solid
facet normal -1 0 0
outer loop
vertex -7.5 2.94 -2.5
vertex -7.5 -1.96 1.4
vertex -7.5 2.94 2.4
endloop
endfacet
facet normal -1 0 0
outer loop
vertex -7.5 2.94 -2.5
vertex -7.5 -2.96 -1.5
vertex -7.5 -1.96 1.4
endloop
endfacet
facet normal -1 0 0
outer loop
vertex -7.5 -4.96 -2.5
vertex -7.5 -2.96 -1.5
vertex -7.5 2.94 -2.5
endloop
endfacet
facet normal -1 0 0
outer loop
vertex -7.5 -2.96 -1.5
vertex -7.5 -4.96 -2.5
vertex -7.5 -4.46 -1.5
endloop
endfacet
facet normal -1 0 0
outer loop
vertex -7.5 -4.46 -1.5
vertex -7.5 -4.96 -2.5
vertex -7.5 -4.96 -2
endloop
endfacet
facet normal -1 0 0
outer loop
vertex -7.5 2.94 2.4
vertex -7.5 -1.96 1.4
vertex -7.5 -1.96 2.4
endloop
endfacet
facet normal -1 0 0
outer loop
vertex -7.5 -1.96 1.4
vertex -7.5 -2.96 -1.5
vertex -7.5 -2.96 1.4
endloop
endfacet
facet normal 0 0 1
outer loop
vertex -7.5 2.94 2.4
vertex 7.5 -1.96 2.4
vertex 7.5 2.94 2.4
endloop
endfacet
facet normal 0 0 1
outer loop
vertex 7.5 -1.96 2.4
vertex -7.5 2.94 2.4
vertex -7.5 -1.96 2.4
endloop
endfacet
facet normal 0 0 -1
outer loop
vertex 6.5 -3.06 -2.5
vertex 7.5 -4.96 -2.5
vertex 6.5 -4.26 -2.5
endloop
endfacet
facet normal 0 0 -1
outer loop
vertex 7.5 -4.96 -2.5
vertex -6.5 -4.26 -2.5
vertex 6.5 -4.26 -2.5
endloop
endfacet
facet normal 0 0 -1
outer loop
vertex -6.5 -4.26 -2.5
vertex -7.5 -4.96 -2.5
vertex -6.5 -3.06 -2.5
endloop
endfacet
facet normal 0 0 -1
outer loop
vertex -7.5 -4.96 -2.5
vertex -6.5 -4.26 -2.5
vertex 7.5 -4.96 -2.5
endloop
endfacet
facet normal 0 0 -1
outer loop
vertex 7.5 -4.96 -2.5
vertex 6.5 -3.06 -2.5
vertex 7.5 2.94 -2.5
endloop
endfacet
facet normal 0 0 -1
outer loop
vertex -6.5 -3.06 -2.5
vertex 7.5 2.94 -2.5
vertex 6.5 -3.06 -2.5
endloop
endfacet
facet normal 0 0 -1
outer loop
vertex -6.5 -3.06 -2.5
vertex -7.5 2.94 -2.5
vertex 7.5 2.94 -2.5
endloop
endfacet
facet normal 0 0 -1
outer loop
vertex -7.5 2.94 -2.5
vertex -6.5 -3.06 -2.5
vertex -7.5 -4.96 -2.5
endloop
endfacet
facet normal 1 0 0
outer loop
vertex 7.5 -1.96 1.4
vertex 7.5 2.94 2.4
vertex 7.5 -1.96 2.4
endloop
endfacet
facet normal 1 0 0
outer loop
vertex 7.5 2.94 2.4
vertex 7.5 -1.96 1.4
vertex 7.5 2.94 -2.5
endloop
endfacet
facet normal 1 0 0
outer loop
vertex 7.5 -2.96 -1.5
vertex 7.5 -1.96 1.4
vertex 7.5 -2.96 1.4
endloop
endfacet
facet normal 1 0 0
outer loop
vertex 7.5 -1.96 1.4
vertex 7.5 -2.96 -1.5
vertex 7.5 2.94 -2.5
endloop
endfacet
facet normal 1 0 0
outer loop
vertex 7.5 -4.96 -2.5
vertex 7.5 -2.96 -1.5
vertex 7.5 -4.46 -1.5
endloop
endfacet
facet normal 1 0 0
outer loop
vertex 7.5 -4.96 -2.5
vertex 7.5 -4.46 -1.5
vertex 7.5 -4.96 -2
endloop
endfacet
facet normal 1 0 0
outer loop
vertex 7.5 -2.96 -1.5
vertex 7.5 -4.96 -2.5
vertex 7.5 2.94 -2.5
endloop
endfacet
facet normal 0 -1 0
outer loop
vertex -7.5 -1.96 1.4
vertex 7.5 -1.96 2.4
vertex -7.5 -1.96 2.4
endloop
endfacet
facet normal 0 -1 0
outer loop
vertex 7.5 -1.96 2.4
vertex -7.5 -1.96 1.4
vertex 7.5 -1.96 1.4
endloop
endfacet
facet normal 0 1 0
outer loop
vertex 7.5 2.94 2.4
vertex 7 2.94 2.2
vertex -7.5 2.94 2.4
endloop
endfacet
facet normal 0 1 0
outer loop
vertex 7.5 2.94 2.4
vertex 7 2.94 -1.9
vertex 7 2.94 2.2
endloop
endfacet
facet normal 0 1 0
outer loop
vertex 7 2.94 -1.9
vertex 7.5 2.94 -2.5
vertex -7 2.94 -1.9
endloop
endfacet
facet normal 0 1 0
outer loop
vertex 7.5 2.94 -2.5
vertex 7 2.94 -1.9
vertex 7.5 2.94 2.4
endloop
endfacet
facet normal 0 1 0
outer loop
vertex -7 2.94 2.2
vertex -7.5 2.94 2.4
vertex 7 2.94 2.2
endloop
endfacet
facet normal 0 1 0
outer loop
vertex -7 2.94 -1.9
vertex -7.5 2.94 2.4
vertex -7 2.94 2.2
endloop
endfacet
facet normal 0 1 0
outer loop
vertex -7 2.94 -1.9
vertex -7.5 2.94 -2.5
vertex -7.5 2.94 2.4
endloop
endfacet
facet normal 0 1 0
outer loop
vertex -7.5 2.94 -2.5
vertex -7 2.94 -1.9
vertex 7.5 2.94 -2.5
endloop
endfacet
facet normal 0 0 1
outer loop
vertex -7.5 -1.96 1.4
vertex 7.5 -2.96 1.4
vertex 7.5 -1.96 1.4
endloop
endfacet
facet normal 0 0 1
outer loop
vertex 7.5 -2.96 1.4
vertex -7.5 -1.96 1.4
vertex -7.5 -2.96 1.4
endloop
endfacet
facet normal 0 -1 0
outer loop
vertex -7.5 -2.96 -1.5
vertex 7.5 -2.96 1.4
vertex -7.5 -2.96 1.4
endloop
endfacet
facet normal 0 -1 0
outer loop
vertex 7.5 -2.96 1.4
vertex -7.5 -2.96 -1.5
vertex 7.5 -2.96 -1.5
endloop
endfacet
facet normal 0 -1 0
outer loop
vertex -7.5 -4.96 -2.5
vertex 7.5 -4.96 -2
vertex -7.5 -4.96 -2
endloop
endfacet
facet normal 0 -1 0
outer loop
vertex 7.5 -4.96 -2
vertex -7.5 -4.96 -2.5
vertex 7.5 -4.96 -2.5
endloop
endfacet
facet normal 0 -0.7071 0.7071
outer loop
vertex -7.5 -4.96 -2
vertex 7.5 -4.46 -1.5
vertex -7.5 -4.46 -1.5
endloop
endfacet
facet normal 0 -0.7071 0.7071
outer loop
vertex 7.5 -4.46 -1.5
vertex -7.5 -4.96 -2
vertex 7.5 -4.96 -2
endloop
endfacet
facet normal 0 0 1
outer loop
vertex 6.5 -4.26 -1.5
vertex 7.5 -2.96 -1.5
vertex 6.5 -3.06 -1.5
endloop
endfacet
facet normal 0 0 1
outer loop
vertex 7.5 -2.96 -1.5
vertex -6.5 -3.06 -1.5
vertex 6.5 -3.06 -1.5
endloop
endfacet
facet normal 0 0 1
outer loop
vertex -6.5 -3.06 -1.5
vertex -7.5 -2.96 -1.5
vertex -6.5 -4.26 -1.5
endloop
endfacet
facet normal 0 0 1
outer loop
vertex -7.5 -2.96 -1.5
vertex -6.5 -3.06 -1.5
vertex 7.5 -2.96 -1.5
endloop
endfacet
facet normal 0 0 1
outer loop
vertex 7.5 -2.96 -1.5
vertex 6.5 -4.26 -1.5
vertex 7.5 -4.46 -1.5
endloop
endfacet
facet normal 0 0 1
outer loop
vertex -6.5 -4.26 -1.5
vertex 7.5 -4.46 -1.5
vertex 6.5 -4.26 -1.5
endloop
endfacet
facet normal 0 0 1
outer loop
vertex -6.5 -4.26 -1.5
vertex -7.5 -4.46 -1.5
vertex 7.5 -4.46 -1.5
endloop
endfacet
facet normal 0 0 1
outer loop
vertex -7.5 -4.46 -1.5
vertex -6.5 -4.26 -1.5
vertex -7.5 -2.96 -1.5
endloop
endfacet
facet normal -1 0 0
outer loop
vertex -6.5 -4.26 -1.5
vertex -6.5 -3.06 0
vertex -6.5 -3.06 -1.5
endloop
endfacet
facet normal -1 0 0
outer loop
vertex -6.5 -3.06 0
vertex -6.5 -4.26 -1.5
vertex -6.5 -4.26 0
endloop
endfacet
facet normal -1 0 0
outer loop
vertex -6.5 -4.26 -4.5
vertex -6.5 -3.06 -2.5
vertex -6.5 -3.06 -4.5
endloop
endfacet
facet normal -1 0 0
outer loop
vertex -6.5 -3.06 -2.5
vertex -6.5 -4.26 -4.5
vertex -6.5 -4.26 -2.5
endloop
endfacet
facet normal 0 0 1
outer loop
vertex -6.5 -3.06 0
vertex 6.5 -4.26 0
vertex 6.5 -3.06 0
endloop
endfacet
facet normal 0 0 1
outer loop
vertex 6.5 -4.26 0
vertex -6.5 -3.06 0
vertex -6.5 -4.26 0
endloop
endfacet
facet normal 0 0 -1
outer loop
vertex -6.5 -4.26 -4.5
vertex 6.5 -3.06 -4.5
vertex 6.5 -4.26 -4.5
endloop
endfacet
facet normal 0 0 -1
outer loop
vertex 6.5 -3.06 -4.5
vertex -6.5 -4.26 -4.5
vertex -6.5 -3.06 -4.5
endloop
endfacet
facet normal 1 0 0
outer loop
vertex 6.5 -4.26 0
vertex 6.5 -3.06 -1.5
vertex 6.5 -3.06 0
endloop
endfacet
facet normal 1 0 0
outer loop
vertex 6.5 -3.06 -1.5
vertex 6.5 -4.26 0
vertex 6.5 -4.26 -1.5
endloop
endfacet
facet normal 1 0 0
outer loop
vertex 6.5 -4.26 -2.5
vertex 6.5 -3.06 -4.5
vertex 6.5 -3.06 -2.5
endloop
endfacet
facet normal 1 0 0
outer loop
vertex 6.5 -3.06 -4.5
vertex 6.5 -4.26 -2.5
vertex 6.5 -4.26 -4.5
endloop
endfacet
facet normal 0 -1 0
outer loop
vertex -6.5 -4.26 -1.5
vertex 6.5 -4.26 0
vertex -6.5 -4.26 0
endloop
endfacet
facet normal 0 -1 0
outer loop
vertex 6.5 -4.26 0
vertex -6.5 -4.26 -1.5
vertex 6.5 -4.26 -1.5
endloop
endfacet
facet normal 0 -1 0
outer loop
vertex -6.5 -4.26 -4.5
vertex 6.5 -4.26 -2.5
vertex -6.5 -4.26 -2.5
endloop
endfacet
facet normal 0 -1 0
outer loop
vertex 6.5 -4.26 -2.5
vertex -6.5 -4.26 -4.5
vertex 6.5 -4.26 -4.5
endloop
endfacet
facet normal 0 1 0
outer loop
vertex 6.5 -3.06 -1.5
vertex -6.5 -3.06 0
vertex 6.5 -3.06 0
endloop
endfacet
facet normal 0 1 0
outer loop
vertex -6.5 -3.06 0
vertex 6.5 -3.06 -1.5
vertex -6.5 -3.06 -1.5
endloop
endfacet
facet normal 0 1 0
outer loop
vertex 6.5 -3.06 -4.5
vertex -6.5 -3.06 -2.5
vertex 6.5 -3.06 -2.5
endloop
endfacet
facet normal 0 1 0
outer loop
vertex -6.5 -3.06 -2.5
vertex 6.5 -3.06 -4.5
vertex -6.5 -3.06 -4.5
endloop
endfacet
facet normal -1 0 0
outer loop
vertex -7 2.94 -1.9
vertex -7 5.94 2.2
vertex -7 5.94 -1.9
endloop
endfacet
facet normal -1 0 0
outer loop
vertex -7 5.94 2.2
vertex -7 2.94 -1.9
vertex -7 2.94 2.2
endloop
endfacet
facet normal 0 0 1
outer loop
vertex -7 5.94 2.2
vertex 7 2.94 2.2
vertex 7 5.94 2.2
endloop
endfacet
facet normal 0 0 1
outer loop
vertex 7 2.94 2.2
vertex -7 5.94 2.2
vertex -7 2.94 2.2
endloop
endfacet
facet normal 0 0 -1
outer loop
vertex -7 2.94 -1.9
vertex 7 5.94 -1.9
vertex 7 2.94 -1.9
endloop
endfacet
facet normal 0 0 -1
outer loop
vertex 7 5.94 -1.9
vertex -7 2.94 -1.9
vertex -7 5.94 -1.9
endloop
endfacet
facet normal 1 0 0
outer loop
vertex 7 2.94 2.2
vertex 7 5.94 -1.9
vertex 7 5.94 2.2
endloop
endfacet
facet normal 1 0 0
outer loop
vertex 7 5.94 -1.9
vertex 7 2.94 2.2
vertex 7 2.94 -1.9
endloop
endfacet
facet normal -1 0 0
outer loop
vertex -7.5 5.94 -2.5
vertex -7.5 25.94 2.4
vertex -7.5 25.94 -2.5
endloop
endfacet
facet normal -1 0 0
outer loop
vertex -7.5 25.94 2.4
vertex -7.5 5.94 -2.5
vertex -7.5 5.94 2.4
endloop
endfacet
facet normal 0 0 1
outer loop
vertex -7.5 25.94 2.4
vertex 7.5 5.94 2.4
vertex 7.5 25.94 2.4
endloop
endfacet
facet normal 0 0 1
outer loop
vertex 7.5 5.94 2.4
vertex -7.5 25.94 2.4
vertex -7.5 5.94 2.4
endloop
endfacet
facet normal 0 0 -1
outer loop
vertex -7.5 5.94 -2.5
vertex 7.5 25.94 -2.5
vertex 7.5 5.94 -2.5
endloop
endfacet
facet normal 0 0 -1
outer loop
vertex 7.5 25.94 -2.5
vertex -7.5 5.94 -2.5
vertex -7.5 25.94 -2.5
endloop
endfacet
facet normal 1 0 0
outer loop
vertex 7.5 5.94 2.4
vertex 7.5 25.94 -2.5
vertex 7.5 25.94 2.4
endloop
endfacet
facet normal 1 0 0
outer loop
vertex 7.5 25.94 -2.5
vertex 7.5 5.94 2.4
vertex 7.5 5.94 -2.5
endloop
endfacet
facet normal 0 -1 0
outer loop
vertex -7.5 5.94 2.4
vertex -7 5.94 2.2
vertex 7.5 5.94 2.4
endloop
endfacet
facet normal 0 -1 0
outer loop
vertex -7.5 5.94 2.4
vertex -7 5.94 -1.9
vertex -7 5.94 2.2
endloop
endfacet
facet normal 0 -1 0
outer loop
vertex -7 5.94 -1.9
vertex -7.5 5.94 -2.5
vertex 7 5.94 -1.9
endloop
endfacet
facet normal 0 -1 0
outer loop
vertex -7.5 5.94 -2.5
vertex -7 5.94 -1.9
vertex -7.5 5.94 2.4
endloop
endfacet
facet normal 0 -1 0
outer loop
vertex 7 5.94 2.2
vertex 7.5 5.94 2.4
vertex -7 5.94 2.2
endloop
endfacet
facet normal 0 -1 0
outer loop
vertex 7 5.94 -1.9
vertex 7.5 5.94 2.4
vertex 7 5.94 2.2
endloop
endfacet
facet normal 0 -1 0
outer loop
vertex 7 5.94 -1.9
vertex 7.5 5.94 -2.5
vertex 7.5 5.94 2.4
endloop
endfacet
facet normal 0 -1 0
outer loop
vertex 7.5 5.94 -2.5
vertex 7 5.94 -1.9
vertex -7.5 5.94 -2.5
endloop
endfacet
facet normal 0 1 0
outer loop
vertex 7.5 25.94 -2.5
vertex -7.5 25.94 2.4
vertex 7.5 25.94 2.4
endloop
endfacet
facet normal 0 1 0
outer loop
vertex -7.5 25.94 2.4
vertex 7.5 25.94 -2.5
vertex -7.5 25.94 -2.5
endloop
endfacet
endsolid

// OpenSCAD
N=5;
A=2.5+N*2.5;
rotate([0,0,180])
translate([-A/2,-2.94,-2.5])
{
	cube([A,4.9,4.9]);
	cube([A,5.9,3.9]);
	hull()
	{
		cube([A,7.4,1]);
		cube([A,7.9,0.5]);
	}
	translate([1,6,-2])cube([A-2,1.2,4.5]); // Assumes cropped pins
	// Plug
	translate([0.5,-20,0.6])cube([A-1,21,4.1]);
	translate([0,-23,0])cube([A,20,4.9]);
}
